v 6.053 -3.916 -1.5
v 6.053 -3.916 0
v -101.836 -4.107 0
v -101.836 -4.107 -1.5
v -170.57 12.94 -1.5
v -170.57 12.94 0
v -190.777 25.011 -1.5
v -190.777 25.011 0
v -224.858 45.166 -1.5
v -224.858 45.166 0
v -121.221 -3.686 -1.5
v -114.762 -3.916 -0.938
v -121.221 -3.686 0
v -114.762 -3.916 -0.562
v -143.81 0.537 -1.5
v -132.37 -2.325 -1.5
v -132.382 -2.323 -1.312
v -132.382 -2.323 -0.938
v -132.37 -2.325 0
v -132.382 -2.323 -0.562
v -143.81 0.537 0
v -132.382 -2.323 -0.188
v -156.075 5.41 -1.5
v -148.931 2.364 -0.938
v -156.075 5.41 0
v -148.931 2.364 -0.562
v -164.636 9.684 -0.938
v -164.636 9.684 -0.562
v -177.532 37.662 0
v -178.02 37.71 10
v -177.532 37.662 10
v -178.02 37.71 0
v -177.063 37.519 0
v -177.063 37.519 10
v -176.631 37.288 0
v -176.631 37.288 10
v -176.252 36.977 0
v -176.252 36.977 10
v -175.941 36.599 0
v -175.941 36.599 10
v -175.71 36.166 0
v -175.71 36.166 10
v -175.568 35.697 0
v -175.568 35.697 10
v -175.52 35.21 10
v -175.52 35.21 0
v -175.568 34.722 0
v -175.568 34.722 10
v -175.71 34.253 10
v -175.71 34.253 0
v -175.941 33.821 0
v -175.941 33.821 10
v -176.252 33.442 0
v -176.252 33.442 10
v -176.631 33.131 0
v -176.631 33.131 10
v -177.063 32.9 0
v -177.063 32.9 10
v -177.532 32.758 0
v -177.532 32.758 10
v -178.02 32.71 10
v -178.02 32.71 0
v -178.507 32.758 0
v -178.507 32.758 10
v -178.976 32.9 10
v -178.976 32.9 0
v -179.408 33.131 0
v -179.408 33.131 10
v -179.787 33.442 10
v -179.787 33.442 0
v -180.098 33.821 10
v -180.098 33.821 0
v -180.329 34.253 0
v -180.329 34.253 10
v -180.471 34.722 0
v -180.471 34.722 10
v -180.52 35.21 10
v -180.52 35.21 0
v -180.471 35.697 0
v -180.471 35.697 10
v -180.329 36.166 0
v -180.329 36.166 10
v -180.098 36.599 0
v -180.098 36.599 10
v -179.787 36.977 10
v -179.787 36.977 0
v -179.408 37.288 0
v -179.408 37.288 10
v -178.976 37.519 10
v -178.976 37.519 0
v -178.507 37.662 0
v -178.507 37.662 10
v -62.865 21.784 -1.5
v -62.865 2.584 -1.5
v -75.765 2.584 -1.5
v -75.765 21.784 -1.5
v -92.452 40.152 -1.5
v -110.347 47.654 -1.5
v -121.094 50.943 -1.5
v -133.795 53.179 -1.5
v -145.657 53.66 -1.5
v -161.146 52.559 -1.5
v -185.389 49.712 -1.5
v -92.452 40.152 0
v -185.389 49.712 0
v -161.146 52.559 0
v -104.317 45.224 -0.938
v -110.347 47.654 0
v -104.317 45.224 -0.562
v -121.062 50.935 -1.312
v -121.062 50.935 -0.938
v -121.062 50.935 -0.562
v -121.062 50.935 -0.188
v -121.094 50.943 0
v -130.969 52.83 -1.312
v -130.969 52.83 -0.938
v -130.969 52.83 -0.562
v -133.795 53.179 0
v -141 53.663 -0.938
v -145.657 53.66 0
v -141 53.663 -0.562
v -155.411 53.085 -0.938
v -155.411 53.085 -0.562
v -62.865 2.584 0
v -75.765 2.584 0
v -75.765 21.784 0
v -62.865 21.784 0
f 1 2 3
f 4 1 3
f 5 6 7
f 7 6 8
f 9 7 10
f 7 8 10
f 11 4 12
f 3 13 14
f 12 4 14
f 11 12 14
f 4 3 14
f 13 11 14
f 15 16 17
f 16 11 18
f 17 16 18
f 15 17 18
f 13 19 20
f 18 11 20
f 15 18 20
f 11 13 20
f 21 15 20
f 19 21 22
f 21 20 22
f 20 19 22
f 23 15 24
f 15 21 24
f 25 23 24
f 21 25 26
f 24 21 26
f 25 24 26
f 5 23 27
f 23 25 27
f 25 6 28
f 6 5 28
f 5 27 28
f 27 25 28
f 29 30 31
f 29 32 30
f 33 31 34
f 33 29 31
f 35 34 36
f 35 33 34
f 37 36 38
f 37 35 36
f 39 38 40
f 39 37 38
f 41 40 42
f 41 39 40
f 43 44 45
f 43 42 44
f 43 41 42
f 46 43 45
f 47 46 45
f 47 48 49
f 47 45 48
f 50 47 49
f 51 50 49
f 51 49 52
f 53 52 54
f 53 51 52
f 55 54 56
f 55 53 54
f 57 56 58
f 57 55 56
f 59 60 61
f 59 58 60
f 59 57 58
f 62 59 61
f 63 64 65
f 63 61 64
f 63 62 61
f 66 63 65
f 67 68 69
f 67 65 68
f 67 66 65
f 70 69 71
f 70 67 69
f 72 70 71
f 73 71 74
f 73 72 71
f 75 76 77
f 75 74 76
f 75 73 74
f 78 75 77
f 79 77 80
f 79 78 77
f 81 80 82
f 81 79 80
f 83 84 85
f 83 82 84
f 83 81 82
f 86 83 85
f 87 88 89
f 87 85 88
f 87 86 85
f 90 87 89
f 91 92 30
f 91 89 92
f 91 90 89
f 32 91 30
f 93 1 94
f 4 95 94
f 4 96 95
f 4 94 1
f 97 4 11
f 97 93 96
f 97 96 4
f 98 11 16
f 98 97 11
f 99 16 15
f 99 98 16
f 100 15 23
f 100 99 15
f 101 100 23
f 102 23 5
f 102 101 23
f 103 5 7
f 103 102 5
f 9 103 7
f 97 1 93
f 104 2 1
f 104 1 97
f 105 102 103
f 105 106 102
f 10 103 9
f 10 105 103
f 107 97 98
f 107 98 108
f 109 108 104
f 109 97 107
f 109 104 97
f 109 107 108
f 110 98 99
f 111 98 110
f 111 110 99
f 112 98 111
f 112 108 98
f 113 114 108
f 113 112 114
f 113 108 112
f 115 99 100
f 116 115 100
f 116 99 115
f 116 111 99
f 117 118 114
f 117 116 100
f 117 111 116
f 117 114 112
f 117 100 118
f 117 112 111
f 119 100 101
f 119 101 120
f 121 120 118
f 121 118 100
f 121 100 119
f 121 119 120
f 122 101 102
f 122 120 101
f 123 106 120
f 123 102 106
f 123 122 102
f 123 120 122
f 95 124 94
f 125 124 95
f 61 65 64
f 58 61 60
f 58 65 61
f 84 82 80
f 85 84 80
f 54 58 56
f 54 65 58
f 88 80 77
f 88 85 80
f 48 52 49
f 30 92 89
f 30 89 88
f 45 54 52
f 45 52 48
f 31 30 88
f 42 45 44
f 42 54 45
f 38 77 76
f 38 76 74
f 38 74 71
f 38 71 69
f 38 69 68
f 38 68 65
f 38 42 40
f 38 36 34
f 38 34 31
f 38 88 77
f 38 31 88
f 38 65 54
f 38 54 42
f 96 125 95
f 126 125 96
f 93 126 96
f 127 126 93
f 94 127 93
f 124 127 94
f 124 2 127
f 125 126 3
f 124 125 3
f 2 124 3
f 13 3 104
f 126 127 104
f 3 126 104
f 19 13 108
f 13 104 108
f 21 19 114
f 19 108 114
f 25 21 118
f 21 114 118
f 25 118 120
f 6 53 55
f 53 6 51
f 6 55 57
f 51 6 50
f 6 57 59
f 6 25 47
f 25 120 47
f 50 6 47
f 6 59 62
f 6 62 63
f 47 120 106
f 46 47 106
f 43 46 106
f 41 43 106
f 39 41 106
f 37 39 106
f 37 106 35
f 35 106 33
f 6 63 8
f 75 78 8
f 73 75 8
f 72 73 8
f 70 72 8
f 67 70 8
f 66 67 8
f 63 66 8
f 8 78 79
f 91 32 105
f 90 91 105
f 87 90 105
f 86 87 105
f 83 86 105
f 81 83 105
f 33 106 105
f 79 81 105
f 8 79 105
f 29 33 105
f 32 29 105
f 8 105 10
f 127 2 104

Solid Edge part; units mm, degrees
sketch "Sketch1" plane through (0, 0, 0) normal (0, 0, 1) x (1, 0, 0)
  spline S0 degree 3 poles (6.0526, -3.916) (-16.0968, -3.916) (-53.3701, -3.6894) (-97.6026, -4.4189) (-123.6184, -3.6826) (-131.3681, -2.5848) (-145.527, 0.3726) (-166.7781, 9.9712) (-195.0718, 27.9174) (-213.8175, 38.6607) (-224.8582, 45.1656) knots 0 0 0 0 0.24868 0.497359 0.533813 0.570267 0.593822 0.712253 0.856127 1 1 1 1
  spline S1 degree 3 poles (6.0526, -3.916) (-14.1819, 5.093) (-48.3266, 20.0457) (-88.4328, 38.7056) (-112.5044, 48.612) (-124.644, 52.0878) (-139.1094, 54.1956) (-162.2143, 52.7729) (-190.6657, 48.8879) (-212.1262, 46.6175) (-224.8582, 45.1656) knots 0 0 0 0 0.248622 0.497244 0.53369 0.570135 0.652958 0.71232 0.85616 1 1 1 1
extrude "Protrusion1" add sketch "Sketch1" against normal blind 1.5
sketch "Sketch2" plane through (-109.4028, 24.8883, 0) normal (0, 0, 1) x (-1, 0, 0)
  line L0 (-33.6378, 22.3043) -> (-33.6378, 3.1043)
  line L1 (-33.6378, 3.1043) -> (-46.5378, 3.1043)
  line L2 (-46.5378, 3.1043) -> (-46.5378, 22.3043)
  line L3 (-46.5378, 22.3043) -> (-33.6378, 22.3043)
extrude "Cutout1" cut sketch "Sketch2" against normal through all
sketch "Sketch3" plane through (-109.4028, 24.8883, 0) normal (0, 0, 1) x (0, 1, 0)
  circle A0 centre (10.3214, 68.6167) radius 2.5
extrude "Protrusion2" add sketch "Sketch3" along normal blind 10
